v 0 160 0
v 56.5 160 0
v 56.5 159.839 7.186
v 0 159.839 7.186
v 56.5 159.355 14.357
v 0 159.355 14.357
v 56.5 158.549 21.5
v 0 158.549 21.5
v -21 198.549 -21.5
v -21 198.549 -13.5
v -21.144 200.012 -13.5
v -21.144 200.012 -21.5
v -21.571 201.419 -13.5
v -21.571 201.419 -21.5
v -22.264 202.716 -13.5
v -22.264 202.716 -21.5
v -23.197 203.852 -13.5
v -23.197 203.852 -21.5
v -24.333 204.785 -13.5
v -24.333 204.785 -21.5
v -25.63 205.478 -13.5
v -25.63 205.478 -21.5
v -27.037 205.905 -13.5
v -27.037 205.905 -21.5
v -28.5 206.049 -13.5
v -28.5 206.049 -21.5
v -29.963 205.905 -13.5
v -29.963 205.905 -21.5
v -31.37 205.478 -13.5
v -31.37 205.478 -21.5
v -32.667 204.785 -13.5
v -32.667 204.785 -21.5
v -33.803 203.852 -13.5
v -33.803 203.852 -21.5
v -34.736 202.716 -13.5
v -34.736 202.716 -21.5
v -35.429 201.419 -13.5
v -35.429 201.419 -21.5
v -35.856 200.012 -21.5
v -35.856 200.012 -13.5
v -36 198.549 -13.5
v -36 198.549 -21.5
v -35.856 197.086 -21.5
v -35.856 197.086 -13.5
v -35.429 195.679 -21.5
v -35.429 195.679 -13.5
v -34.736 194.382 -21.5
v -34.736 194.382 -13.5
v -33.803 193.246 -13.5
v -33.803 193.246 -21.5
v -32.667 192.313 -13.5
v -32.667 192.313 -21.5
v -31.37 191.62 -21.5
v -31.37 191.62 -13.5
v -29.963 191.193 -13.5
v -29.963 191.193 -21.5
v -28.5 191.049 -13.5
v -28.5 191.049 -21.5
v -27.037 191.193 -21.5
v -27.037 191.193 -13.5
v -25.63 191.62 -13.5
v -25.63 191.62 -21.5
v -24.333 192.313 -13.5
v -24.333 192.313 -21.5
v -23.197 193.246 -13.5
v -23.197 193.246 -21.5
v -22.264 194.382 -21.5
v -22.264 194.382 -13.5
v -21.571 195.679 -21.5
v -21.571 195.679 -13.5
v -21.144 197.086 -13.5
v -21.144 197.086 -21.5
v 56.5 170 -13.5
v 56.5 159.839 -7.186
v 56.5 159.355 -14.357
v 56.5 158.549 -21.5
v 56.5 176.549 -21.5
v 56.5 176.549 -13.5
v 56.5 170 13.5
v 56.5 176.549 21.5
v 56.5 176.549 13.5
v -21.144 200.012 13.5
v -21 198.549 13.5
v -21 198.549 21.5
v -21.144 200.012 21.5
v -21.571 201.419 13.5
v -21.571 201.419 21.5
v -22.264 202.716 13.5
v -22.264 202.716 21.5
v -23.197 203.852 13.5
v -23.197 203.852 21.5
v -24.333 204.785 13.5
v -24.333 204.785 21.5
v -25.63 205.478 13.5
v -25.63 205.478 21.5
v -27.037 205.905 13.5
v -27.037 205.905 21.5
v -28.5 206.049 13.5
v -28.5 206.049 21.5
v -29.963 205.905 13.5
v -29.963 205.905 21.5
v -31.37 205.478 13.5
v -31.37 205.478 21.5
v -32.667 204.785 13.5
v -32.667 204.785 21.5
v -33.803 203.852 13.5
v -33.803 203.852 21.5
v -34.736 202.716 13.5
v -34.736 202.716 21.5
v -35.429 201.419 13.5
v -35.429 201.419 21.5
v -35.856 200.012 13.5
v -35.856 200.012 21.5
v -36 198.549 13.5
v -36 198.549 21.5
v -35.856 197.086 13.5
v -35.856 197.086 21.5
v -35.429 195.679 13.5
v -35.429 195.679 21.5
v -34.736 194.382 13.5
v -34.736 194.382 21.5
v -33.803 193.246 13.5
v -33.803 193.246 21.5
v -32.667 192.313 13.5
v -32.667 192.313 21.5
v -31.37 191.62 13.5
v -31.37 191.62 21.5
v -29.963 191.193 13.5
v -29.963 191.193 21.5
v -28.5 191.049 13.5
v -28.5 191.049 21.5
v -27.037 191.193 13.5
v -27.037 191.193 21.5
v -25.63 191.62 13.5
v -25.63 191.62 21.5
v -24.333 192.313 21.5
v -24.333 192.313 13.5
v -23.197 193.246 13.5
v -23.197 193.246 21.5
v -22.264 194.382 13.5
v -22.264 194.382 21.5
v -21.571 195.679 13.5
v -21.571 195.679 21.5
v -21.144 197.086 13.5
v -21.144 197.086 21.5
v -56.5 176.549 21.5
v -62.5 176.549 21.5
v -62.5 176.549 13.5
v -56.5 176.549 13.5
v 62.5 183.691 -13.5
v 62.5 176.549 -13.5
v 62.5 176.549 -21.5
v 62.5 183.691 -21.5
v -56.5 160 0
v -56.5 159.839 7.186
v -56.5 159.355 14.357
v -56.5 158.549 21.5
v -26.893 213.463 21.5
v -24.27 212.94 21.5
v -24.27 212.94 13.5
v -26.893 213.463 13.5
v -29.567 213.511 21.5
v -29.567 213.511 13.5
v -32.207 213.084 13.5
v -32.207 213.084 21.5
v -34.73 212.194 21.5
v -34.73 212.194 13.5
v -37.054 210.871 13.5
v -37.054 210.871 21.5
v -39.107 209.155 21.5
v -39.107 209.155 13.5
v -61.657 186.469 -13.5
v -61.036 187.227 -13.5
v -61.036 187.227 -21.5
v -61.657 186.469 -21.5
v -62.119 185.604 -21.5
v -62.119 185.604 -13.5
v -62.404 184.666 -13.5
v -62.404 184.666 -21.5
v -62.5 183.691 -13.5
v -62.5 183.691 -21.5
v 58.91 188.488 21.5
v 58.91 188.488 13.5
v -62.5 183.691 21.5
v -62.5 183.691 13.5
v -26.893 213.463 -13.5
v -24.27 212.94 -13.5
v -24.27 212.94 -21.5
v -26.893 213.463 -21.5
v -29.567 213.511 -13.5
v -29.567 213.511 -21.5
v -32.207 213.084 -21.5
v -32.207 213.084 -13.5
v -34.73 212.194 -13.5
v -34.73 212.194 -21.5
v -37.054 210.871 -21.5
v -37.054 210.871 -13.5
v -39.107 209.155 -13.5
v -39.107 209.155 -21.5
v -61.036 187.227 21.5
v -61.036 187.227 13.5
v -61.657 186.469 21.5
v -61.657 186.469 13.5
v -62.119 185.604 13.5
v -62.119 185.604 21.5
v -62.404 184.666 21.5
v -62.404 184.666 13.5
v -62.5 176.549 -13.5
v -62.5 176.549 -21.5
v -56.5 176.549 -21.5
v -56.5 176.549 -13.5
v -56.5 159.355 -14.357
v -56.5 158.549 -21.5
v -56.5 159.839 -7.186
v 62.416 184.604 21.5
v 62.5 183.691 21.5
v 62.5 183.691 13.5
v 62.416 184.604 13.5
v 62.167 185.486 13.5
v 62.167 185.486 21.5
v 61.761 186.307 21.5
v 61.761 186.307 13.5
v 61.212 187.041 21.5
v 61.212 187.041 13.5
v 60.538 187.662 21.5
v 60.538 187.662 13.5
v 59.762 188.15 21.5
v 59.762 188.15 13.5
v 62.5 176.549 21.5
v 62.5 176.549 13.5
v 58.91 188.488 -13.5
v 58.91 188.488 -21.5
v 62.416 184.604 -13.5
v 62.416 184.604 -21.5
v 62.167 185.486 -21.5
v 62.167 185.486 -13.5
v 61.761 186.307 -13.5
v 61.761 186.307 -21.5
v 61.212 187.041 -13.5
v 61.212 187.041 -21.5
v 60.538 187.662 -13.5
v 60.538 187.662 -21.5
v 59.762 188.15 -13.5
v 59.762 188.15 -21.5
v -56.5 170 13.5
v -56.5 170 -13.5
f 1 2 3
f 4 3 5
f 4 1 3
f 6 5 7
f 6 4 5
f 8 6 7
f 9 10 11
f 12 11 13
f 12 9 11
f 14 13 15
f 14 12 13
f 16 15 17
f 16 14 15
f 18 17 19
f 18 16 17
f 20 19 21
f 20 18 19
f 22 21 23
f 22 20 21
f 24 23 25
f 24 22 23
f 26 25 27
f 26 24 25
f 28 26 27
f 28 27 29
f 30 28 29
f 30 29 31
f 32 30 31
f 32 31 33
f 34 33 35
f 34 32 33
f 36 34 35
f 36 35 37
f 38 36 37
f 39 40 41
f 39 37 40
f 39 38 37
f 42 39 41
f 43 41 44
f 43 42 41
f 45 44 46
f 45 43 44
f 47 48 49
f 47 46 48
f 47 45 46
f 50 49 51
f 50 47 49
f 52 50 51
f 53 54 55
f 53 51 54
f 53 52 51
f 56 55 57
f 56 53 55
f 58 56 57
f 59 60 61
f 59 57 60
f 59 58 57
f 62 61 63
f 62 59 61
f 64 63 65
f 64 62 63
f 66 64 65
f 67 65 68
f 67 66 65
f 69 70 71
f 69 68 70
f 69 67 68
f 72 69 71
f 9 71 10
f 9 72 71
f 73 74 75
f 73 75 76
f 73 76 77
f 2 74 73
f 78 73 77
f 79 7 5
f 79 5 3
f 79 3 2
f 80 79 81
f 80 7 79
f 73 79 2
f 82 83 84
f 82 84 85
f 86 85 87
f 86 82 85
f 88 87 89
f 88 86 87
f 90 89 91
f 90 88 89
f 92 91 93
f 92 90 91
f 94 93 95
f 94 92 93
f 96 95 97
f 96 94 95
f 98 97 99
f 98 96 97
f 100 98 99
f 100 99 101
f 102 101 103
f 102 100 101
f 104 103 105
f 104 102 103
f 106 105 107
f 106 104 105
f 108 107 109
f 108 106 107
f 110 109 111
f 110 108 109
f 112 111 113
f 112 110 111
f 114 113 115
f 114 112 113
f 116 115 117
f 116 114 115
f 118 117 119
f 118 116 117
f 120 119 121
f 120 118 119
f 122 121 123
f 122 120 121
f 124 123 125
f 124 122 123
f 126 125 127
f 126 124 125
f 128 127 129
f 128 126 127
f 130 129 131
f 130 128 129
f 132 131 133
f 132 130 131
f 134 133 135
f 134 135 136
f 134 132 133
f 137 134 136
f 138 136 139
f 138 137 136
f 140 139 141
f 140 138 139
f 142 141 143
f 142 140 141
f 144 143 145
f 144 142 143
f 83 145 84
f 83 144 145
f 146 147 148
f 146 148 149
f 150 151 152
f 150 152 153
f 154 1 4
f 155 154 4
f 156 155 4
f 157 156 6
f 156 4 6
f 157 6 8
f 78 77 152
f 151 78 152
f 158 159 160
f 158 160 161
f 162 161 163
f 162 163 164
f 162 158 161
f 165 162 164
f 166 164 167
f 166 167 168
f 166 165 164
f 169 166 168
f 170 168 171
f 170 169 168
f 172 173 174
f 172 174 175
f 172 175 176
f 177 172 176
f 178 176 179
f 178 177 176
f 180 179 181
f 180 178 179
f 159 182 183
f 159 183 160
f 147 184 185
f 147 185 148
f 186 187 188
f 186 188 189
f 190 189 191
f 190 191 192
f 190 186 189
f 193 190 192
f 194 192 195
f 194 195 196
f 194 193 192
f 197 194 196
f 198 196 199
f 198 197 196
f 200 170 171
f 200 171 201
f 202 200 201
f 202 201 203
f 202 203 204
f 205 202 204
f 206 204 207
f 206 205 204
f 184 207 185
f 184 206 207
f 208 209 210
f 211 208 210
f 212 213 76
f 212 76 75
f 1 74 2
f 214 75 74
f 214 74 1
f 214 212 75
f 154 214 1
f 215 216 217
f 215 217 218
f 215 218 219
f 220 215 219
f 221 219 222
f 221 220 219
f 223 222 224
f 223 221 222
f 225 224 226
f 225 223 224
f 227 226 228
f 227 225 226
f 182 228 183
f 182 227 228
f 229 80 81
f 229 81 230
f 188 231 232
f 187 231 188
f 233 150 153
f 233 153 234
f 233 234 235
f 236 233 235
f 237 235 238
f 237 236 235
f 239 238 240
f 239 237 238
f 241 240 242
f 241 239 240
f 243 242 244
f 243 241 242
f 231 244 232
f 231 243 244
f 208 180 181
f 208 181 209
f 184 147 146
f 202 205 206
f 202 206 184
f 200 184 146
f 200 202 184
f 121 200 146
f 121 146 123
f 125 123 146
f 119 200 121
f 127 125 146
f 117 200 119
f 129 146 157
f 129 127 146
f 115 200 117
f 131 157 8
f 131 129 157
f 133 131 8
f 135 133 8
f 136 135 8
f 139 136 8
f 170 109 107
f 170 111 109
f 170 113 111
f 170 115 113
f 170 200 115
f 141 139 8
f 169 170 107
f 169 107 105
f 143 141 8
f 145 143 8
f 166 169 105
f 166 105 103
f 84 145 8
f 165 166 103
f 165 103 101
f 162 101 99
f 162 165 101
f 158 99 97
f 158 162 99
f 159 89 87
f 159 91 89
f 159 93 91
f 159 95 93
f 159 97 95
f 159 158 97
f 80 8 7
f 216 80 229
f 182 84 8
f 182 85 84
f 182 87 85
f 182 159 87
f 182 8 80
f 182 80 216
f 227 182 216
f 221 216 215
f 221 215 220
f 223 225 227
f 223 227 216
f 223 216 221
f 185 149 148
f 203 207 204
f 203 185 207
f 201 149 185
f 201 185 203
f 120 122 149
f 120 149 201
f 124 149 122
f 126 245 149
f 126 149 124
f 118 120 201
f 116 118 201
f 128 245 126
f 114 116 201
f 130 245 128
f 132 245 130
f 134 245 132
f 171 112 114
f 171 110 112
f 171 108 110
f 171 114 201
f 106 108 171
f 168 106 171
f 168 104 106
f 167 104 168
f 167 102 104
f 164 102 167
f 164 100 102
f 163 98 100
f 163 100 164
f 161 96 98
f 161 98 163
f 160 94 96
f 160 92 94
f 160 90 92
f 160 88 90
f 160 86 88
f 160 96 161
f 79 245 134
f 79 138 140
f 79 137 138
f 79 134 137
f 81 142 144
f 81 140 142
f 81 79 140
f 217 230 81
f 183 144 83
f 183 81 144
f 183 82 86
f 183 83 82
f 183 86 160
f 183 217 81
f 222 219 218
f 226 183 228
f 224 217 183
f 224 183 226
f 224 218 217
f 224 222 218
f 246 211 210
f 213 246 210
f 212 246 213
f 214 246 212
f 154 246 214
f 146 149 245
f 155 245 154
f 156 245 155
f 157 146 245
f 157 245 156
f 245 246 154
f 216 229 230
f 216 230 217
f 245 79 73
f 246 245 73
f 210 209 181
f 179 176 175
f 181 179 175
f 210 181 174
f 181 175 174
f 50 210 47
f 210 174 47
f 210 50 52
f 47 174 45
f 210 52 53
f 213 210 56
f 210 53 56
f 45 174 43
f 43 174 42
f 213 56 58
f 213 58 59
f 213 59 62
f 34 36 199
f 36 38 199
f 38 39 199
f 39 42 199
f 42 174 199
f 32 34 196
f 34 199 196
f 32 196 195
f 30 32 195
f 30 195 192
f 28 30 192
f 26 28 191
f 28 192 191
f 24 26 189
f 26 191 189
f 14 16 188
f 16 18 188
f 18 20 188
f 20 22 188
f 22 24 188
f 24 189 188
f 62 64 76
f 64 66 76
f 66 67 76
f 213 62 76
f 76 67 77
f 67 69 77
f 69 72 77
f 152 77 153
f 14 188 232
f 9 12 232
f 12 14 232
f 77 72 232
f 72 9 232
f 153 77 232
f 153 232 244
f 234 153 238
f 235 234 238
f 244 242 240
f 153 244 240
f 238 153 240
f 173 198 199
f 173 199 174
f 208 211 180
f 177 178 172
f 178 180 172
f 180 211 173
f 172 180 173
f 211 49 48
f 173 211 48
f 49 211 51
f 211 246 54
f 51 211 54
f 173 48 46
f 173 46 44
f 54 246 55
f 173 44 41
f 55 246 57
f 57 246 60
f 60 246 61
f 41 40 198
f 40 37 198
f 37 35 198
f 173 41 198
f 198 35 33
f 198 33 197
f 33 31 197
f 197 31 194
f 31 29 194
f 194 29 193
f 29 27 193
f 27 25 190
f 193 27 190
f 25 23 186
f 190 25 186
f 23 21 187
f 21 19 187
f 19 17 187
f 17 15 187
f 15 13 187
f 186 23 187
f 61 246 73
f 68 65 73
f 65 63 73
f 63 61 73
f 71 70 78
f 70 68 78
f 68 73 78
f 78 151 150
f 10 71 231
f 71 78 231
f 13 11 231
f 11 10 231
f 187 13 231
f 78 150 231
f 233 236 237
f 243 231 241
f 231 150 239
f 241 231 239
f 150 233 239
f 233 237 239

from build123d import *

# Parameters (mm, degrees)
SKETCH2_R           = 7.5
BOSS_EXTRUDE1_DEPTH = 21.5
SKETCH1_W           = 13.5
SKETCH1_H           = 90
CUT_EXTRUDE2_DEPTH  = 63


with BuildPart() as part:
    # Sketch2 → Boss-Extrude1 (new, symmetric)
    with BuildSketch(Plane.XY):
        with BuildLine():
            Line((-56.5, 158.548888359), (56.5, 158.548888359))
            Line((56.5, 158.548888359), (56.5, 176.548888359))
            Line((56.5, 176.548888359), (62.5, 176.548888359))
            Line((62.5, 176.548888359), (62.5, 183.691023983))
            ThreePointArc((62.5, 183.691023983), (61.503173004, 186.686788643), (58.91015764, 188.488049669))
            Line((58.91015764, 188.488049669), (-24.26952708, 212.939965417))
            ThreePointArc((-24.26952708, 212.939965417), (-32.207333005, 213.083525678), (-39.106601718, 209.155490077))
            Line((-39.106601718, 209.155490077), (-61.035533906, 187.226557889))
            ThreePointArc((-61.035533906, 187.226557889), (-62.119397663, 185.604441145), (-62.5, 183.691023983))
            Line((-62.5, 183.691023983), (-62.5, 176.548888359))
            Line((-62.5, 176.548888359), (-56.5, 176.548888359))
            Line((-56.5, 176.548888359), (-56.5, 158.548888359))
        make_face()
        with Locations((-28.5, 198.548888359)):
            Circle(SKETCH2_R, mode=Mode.SUBTRACT)
    extrude(amount=BOSS_EXTRUDE1_DEPTH, both=True)

    # Sketch1 → Cut-Extrude2 (cut, symmetric)
    with BuildSketch(Plane(origin=(0, 0, 0), x_dir=(0, 0, -1), z_dir=(1, 0, 0))):
        with BuildLine():
            ThreePointArc((21.5, 158.548888359), (10.774457353, 159.63680988), (0, 160))
            ThreePointArc((0, 160), (-10.774457353, 159.63680988), (-21.5, 158.548888359))
            Line((-21.5, 158.548888359), (21.5, 158.548888359))
        make_face()
        with BuildLine():
            ThreePointArc((160, 0), (120.498962651, 105.261578936), (21.5, 158.548888359))
            Line((21.5, 158.548888359), (-21.5, 158.548888359))
            ThreePointArc((-21.5, 158.548888359), (-105.261578936, -120.498962651), (160, 0))
        make_face()
        with Locations((6.75, 215)):
            Rectangle(SKETCH1_W, SKETCH1_H)
        with Locations((-6.75, 215)):
            Rectangle(SKETCH1_W, SKETCH1_H)
    extrude(amount=CUT_EXTRUDE2_DEPTH, both=True, mode=Mode.SUBTRACT)


solid = part.part
